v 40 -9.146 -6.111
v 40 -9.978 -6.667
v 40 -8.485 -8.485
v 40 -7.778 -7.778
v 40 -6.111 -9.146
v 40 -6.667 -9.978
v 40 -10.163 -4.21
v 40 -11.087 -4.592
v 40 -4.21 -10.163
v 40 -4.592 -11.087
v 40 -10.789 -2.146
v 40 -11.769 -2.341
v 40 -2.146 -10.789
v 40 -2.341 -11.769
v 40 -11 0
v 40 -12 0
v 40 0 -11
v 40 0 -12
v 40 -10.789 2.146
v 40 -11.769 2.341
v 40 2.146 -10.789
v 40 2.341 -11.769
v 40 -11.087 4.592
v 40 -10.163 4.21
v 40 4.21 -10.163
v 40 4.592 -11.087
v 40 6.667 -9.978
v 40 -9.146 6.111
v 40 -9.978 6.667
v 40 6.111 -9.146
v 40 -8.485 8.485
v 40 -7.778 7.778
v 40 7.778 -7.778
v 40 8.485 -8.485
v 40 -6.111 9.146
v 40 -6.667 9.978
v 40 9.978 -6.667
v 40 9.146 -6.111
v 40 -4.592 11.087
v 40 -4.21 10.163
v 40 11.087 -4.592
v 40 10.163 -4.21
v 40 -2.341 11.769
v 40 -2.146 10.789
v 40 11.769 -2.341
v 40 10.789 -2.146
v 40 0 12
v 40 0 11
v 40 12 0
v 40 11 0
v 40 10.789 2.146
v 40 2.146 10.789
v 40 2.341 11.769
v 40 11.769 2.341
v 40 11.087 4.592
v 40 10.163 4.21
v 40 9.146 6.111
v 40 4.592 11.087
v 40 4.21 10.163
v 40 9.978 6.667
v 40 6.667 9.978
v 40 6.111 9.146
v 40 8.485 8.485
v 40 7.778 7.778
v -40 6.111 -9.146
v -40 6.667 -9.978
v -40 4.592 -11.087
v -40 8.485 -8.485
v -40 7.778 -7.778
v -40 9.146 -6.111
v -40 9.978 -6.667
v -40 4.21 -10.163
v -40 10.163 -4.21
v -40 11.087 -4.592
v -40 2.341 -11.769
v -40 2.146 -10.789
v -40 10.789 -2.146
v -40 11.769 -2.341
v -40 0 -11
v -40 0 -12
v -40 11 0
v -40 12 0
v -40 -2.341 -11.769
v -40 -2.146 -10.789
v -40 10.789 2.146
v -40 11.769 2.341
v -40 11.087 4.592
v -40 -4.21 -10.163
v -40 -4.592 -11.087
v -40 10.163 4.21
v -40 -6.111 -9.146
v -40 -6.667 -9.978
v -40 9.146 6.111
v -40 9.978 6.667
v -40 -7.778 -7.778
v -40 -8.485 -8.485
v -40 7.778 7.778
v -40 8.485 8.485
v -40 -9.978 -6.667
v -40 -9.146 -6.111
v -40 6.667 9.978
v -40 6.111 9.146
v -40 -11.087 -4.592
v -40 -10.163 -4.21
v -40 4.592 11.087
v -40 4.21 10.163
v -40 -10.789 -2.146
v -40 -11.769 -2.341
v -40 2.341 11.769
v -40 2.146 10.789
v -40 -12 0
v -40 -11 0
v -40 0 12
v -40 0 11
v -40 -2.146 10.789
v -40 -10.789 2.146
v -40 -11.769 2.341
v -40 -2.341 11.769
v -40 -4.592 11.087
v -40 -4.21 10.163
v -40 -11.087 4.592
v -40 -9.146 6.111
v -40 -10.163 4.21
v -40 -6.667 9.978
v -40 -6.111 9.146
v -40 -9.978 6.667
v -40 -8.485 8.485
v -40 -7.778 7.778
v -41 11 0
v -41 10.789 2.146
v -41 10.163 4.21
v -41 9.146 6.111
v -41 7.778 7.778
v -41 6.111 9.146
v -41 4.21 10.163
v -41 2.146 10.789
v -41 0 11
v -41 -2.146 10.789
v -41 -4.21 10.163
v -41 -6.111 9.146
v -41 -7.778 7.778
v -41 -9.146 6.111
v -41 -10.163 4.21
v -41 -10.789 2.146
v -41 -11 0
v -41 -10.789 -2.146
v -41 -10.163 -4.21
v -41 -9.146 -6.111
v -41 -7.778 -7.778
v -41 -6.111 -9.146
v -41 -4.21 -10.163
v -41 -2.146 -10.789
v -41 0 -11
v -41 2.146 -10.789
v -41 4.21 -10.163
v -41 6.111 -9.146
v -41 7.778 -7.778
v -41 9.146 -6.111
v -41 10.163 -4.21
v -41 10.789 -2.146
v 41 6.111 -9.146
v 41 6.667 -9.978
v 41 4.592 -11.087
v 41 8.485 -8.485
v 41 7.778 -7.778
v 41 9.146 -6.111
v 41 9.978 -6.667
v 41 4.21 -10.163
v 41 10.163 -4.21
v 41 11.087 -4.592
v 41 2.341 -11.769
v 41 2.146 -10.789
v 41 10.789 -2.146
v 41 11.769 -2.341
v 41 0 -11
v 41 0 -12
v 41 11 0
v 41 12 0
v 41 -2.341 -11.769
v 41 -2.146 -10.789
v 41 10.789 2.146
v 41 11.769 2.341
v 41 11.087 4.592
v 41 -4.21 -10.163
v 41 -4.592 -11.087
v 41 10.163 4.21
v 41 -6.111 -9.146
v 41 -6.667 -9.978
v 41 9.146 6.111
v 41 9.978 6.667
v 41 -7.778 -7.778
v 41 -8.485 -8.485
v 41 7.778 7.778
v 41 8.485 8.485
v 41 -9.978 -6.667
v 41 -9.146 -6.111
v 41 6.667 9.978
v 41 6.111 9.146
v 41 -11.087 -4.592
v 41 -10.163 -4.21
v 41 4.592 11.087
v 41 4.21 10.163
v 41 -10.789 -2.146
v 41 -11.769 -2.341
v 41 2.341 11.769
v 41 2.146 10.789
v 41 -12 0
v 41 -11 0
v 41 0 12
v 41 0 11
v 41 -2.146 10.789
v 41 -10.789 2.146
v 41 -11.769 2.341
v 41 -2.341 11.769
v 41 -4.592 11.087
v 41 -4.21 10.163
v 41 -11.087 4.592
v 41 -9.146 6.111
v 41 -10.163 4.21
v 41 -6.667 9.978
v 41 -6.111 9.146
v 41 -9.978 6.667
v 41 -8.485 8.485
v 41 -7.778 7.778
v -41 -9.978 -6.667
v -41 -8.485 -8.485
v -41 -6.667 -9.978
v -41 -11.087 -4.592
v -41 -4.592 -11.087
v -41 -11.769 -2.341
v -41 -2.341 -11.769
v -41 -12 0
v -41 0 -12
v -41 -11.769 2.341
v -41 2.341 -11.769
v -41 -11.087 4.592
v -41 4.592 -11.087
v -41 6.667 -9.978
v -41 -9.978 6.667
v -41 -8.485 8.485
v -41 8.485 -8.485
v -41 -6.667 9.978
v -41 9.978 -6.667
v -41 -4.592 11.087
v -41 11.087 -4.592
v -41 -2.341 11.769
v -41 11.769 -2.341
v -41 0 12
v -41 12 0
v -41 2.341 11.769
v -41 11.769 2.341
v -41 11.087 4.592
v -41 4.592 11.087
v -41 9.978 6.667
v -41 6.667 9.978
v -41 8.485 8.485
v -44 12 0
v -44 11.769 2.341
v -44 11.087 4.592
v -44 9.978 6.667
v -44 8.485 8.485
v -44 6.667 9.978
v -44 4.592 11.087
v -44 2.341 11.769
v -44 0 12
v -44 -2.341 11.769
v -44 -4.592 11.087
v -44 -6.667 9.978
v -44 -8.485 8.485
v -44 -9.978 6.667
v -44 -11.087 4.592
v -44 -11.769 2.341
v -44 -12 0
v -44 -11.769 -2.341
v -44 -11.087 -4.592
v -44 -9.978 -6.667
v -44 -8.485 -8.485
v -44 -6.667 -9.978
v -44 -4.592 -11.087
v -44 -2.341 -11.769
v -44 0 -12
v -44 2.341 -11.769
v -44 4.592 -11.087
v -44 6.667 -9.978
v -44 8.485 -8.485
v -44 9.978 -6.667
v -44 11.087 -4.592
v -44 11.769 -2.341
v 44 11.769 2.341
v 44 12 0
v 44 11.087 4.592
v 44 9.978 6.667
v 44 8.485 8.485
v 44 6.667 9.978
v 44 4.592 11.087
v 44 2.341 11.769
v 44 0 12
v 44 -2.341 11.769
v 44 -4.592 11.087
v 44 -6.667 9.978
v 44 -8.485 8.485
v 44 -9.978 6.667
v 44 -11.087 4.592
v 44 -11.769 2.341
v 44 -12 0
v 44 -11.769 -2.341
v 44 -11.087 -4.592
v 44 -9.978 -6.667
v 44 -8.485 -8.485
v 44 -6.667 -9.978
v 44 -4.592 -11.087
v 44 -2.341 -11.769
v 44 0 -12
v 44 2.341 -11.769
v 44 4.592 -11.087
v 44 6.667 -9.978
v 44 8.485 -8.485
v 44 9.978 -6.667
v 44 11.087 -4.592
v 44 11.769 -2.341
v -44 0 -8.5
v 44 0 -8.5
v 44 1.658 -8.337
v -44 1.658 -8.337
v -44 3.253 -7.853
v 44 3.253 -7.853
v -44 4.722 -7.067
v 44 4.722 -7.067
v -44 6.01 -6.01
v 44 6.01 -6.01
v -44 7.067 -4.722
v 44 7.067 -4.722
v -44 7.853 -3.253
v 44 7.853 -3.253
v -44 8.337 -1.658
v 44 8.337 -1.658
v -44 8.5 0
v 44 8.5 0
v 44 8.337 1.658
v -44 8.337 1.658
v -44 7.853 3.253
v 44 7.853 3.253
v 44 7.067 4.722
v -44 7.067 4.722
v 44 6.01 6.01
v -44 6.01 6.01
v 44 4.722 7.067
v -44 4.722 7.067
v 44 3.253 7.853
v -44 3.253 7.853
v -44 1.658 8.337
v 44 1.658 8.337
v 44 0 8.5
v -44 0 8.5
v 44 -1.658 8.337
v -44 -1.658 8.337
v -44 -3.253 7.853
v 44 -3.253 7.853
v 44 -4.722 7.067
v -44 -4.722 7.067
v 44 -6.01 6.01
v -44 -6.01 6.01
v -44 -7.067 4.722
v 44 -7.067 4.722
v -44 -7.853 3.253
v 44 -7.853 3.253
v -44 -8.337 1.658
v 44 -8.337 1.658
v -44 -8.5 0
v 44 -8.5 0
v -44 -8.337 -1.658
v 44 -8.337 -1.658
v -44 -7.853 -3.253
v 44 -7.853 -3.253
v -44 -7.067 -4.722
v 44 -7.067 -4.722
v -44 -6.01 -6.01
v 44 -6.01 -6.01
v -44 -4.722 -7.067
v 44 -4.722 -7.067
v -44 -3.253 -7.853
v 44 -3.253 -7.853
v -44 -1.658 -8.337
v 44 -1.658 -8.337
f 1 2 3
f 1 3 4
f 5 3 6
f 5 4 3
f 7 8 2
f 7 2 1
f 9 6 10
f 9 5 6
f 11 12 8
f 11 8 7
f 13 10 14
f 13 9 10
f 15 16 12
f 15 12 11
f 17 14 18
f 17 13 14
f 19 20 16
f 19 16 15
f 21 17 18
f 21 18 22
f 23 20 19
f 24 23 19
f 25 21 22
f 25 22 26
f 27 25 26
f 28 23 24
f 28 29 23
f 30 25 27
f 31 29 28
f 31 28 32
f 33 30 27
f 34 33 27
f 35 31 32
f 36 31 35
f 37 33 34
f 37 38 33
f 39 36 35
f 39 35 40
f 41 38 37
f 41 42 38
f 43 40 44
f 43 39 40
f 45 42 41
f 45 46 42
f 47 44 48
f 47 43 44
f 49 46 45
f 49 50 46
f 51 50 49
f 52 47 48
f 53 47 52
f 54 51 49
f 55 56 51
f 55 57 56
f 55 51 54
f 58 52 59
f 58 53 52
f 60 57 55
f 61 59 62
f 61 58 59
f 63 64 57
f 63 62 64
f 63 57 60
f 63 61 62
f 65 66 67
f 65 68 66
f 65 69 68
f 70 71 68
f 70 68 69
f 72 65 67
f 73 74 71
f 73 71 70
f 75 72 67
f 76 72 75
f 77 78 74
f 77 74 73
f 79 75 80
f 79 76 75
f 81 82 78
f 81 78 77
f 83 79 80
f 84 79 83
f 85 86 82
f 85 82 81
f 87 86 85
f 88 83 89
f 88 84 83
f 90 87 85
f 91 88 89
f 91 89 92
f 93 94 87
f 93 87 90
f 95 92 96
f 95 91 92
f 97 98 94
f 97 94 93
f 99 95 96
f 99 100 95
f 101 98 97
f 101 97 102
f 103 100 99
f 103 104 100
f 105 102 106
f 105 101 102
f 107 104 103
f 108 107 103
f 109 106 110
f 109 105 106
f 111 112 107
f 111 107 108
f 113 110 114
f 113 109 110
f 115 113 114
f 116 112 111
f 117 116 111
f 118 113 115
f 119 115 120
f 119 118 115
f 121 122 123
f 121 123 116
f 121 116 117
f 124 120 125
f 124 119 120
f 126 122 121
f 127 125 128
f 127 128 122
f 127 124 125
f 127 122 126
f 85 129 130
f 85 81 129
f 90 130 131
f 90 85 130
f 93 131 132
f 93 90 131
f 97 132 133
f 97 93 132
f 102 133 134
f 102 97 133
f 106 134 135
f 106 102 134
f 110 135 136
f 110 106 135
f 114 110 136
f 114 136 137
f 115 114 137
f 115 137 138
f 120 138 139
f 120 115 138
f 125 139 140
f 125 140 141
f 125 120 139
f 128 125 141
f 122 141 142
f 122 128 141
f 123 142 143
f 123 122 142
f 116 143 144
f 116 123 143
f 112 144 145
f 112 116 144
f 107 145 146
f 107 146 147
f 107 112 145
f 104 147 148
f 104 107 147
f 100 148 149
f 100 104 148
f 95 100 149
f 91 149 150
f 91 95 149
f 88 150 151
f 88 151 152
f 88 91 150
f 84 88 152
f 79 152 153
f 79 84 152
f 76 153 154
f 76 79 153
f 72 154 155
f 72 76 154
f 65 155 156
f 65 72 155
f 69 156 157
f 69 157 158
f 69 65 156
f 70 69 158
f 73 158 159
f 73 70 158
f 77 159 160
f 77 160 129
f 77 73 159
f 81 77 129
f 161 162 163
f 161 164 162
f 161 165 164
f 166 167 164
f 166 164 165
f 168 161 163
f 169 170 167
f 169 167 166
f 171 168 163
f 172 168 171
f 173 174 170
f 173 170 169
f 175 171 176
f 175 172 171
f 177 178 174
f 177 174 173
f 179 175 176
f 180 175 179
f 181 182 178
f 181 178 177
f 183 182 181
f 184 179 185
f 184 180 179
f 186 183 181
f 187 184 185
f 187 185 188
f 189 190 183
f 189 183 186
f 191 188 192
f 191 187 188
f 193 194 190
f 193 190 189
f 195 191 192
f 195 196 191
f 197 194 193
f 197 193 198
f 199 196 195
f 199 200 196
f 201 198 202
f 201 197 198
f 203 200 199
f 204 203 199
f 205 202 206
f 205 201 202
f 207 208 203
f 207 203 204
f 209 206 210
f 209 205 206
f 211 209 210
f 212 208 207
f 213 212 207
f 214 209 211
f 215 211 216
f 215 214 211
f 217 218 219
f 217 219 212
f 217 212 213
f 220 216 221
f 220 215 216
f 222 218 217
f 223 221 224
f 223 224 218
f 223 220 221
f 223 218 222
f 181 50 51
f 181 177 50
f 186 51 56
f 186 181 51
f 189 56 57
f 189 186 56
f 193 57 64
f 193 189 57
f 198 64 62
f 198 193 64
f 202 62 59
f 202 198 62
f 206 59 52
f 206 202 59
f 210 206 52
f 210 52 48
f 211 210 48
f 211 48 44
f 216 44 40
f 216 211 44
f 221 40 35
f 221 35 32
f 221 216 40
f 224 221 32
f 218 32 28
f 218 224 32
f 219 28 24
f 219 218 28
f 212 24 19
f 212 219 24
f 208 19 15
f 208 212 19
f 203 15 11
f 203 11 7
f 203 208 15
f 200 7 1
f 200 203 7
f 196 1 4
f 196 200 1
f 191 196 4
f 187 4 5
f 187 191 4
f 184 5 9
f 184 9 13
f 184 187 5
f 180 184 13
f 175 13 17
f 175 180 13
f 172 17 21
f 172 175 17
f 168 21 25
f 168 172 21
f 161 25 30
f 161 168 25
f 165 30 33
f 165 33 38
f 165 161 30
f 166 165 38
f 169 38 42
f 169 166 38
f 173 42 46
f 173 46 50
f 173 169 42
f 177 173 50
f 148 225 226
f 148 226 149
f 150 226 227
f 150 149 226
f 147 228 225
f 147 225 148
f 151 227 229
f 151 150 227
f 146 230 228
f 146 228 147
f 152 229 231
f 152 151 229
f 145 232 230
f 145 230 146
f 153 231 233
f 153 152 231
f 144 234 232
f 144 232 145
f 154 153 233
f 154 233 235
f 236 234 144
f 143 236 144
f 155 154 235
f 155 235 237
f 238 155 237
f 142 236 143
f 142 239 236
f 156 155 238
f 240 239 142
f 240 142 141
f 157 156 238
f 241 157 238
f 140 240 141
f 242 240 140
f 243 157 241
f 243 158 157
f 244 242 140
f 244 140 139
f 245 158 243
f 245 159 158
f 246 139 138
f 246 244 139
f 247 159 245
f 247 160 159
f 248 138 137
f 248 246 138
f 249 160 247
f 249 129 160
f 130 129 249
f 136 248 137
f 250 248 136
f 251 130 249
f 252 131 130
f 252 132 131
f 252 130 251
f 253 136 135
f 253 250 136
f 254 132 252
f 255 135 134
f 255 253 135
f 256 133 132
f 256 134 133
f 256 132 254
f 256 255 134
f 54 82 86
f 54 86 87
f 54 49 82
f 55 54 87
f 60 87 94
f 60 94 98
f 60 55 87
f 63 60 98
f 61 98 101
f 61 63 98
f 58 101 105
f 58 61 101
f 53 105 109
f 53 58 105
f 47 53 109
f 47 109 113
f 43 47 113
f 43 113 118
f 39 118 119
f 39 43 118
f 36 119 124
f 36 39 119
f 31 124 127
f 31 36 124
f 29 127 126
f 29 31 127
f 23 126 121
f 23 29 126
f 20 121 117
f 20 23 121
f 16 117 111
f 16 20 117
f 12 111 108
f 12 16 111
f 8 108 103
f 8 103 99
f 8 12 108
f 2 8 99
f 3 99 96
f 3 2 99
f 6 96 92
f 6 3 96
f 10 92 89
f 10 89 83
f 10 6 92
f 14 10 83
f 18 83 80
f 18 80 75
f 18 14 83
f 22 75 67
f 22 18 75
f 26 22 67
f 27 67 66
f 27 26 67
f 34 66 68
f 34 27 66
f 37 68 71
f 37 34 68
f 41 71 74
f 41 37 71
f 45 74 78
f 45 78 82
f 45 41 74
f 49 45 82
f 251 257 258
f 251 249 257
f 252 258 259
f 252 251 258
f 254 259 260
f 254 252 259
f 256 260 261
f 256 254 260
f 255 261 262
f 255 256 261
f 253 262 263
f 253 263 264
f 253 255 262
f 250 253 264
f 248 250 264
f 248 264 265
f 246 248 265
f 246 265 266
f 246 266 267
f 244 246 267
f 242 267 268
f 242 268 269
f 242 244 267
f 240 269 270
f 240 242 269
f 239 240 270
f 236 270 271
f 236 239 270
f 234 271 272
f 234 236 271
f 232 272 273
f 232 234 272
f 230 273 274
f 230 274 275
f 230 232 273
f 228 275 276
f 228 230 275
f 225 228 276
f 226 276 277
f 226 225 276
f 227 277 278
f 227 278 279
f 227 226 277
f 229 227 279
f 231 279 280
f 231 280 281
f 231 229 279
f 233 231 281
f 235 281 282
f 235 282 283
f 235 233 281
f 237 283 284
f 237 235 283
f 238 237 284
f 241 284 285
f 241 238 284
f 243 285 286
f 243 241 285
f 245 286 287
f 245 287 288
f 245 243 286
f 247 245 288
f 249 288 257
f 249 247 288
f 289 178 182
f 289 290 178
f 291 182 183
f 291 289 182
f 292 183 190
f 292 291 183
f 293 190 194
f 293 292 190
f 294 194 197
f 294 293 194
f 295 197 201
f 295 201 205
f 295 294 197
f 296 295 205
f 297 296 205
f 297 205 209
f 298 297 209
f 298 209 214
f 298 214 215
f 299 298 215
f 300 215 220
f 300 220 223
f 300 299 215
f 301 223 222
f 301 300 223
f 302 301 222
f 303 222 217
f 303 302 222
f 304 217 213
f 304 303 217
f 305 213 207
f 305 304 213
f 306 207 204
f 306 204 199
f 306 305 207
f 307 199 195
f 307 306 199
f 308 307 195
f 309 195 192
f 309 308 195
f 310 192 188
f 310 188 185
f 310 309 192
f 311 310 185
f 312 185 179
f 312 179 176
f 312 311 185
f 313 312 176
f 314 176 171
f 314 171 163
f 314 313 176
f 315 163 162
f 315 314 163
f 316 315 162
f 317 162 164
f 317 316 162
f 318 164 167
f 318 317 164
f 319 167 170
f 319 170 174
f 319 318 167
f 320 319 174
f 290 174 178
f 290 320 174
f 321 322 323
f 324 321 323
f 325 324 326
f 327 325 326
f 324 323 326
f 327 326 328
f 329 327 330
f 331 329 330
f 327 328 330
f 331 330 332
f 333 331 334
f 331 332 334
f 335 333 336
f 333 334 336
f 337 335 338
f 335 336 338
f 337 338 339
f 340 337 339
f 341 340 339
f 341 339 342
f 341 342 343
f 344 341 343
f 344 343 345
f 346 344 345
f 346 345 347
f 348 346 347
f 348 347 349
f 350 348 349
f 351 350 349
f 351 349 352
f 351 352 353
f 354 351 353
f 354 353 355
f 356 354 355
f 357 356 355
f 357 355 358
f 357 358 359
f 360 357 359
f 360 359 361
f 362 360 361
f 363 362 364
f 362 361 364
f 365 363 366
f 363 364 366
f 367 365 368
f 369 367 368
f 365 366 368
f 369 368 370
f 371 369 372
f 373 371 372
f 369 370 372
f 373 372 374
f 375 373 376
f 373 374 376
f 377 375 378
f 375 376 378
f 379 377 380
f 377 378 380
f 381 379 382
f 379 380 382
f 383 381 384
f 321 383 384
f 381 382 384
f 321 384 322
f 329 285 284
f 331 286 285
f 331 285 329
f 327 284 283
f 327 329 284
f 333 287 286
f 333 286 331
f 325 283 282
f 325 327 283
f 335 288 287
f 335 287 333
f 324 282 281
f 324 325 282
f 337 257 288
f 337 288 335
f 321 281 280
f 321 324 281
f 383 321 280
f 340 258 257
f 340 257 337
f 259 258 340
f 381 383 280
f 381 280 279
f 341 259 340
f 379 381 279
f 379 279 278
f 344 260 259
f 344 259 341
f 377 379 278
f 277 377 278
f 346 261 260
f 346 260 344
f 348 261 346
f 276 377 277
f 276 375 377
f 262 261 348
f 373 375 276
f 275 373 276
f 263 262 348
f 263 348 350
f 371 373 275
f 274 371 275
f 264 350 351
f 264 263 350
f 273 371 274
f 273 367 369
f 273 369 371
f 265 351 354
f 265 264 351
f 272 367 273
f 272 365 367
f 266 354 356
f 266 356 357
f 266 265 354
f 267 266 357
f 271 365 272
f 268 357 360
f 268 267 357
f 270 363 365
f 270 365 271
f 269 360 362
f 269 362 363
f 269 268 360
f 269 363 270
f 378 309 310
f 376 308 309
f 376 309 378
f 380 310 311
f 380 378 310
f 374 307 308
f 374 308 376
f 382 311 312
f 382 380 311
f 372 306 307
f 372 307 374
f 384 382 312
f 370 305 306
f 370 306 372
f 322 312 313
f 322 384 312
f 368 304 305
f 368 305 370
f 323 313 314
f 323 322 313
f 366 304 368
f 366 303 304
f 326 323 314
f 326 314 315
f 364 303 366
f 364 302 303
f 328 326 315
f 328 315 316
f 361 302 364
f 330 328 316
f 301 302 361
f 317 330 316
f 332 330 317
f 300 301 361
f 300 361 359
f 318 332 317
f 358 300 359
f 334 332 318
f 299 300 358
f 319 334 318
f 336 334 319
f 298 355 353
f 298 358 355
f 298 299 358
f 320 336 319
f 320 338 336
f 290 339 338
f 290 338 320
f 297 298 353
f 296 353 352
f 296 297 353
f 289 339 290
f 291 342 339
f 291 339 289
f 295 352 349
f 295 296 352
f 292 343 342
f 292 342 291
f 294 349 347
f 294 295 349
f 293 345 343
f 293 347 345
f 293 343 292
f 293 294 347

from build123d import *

# Parameters (mm, degrees)
IZIM2_R               = 8.5
KES_EKSTR_ZYON1_DEPTH = 89


with BuildPart() as part:
    # Çizim1 → Döndür1 (revolve)
    with BuildSketch(Plane.XY):
        Polygon((-44, 0), (-44, 12), (-41, 12), (-41, 11), (-40, 11), (-40, 12), (40, 12), (40, 11), (41, 11), (41, 12), (44, 12), (44, 0), align=None)
    revolve(axis=Axis((-44, 0, 0), (1, 0, 0)))

    # Çizim2 → Kes-Ekstrüzyon1 (cut, through all)
    with BuildSketch(Plane(origin=(44, 0, 0), x_dir=(0, 0, -1), z_dir=(1, 0, 0))):
        Circle(IZIM2_R)
    extrude(amount=-KES_EKSTR_ZYON1_DEPTH, mode=Mode.SUBTRACT)


solid = part.part
